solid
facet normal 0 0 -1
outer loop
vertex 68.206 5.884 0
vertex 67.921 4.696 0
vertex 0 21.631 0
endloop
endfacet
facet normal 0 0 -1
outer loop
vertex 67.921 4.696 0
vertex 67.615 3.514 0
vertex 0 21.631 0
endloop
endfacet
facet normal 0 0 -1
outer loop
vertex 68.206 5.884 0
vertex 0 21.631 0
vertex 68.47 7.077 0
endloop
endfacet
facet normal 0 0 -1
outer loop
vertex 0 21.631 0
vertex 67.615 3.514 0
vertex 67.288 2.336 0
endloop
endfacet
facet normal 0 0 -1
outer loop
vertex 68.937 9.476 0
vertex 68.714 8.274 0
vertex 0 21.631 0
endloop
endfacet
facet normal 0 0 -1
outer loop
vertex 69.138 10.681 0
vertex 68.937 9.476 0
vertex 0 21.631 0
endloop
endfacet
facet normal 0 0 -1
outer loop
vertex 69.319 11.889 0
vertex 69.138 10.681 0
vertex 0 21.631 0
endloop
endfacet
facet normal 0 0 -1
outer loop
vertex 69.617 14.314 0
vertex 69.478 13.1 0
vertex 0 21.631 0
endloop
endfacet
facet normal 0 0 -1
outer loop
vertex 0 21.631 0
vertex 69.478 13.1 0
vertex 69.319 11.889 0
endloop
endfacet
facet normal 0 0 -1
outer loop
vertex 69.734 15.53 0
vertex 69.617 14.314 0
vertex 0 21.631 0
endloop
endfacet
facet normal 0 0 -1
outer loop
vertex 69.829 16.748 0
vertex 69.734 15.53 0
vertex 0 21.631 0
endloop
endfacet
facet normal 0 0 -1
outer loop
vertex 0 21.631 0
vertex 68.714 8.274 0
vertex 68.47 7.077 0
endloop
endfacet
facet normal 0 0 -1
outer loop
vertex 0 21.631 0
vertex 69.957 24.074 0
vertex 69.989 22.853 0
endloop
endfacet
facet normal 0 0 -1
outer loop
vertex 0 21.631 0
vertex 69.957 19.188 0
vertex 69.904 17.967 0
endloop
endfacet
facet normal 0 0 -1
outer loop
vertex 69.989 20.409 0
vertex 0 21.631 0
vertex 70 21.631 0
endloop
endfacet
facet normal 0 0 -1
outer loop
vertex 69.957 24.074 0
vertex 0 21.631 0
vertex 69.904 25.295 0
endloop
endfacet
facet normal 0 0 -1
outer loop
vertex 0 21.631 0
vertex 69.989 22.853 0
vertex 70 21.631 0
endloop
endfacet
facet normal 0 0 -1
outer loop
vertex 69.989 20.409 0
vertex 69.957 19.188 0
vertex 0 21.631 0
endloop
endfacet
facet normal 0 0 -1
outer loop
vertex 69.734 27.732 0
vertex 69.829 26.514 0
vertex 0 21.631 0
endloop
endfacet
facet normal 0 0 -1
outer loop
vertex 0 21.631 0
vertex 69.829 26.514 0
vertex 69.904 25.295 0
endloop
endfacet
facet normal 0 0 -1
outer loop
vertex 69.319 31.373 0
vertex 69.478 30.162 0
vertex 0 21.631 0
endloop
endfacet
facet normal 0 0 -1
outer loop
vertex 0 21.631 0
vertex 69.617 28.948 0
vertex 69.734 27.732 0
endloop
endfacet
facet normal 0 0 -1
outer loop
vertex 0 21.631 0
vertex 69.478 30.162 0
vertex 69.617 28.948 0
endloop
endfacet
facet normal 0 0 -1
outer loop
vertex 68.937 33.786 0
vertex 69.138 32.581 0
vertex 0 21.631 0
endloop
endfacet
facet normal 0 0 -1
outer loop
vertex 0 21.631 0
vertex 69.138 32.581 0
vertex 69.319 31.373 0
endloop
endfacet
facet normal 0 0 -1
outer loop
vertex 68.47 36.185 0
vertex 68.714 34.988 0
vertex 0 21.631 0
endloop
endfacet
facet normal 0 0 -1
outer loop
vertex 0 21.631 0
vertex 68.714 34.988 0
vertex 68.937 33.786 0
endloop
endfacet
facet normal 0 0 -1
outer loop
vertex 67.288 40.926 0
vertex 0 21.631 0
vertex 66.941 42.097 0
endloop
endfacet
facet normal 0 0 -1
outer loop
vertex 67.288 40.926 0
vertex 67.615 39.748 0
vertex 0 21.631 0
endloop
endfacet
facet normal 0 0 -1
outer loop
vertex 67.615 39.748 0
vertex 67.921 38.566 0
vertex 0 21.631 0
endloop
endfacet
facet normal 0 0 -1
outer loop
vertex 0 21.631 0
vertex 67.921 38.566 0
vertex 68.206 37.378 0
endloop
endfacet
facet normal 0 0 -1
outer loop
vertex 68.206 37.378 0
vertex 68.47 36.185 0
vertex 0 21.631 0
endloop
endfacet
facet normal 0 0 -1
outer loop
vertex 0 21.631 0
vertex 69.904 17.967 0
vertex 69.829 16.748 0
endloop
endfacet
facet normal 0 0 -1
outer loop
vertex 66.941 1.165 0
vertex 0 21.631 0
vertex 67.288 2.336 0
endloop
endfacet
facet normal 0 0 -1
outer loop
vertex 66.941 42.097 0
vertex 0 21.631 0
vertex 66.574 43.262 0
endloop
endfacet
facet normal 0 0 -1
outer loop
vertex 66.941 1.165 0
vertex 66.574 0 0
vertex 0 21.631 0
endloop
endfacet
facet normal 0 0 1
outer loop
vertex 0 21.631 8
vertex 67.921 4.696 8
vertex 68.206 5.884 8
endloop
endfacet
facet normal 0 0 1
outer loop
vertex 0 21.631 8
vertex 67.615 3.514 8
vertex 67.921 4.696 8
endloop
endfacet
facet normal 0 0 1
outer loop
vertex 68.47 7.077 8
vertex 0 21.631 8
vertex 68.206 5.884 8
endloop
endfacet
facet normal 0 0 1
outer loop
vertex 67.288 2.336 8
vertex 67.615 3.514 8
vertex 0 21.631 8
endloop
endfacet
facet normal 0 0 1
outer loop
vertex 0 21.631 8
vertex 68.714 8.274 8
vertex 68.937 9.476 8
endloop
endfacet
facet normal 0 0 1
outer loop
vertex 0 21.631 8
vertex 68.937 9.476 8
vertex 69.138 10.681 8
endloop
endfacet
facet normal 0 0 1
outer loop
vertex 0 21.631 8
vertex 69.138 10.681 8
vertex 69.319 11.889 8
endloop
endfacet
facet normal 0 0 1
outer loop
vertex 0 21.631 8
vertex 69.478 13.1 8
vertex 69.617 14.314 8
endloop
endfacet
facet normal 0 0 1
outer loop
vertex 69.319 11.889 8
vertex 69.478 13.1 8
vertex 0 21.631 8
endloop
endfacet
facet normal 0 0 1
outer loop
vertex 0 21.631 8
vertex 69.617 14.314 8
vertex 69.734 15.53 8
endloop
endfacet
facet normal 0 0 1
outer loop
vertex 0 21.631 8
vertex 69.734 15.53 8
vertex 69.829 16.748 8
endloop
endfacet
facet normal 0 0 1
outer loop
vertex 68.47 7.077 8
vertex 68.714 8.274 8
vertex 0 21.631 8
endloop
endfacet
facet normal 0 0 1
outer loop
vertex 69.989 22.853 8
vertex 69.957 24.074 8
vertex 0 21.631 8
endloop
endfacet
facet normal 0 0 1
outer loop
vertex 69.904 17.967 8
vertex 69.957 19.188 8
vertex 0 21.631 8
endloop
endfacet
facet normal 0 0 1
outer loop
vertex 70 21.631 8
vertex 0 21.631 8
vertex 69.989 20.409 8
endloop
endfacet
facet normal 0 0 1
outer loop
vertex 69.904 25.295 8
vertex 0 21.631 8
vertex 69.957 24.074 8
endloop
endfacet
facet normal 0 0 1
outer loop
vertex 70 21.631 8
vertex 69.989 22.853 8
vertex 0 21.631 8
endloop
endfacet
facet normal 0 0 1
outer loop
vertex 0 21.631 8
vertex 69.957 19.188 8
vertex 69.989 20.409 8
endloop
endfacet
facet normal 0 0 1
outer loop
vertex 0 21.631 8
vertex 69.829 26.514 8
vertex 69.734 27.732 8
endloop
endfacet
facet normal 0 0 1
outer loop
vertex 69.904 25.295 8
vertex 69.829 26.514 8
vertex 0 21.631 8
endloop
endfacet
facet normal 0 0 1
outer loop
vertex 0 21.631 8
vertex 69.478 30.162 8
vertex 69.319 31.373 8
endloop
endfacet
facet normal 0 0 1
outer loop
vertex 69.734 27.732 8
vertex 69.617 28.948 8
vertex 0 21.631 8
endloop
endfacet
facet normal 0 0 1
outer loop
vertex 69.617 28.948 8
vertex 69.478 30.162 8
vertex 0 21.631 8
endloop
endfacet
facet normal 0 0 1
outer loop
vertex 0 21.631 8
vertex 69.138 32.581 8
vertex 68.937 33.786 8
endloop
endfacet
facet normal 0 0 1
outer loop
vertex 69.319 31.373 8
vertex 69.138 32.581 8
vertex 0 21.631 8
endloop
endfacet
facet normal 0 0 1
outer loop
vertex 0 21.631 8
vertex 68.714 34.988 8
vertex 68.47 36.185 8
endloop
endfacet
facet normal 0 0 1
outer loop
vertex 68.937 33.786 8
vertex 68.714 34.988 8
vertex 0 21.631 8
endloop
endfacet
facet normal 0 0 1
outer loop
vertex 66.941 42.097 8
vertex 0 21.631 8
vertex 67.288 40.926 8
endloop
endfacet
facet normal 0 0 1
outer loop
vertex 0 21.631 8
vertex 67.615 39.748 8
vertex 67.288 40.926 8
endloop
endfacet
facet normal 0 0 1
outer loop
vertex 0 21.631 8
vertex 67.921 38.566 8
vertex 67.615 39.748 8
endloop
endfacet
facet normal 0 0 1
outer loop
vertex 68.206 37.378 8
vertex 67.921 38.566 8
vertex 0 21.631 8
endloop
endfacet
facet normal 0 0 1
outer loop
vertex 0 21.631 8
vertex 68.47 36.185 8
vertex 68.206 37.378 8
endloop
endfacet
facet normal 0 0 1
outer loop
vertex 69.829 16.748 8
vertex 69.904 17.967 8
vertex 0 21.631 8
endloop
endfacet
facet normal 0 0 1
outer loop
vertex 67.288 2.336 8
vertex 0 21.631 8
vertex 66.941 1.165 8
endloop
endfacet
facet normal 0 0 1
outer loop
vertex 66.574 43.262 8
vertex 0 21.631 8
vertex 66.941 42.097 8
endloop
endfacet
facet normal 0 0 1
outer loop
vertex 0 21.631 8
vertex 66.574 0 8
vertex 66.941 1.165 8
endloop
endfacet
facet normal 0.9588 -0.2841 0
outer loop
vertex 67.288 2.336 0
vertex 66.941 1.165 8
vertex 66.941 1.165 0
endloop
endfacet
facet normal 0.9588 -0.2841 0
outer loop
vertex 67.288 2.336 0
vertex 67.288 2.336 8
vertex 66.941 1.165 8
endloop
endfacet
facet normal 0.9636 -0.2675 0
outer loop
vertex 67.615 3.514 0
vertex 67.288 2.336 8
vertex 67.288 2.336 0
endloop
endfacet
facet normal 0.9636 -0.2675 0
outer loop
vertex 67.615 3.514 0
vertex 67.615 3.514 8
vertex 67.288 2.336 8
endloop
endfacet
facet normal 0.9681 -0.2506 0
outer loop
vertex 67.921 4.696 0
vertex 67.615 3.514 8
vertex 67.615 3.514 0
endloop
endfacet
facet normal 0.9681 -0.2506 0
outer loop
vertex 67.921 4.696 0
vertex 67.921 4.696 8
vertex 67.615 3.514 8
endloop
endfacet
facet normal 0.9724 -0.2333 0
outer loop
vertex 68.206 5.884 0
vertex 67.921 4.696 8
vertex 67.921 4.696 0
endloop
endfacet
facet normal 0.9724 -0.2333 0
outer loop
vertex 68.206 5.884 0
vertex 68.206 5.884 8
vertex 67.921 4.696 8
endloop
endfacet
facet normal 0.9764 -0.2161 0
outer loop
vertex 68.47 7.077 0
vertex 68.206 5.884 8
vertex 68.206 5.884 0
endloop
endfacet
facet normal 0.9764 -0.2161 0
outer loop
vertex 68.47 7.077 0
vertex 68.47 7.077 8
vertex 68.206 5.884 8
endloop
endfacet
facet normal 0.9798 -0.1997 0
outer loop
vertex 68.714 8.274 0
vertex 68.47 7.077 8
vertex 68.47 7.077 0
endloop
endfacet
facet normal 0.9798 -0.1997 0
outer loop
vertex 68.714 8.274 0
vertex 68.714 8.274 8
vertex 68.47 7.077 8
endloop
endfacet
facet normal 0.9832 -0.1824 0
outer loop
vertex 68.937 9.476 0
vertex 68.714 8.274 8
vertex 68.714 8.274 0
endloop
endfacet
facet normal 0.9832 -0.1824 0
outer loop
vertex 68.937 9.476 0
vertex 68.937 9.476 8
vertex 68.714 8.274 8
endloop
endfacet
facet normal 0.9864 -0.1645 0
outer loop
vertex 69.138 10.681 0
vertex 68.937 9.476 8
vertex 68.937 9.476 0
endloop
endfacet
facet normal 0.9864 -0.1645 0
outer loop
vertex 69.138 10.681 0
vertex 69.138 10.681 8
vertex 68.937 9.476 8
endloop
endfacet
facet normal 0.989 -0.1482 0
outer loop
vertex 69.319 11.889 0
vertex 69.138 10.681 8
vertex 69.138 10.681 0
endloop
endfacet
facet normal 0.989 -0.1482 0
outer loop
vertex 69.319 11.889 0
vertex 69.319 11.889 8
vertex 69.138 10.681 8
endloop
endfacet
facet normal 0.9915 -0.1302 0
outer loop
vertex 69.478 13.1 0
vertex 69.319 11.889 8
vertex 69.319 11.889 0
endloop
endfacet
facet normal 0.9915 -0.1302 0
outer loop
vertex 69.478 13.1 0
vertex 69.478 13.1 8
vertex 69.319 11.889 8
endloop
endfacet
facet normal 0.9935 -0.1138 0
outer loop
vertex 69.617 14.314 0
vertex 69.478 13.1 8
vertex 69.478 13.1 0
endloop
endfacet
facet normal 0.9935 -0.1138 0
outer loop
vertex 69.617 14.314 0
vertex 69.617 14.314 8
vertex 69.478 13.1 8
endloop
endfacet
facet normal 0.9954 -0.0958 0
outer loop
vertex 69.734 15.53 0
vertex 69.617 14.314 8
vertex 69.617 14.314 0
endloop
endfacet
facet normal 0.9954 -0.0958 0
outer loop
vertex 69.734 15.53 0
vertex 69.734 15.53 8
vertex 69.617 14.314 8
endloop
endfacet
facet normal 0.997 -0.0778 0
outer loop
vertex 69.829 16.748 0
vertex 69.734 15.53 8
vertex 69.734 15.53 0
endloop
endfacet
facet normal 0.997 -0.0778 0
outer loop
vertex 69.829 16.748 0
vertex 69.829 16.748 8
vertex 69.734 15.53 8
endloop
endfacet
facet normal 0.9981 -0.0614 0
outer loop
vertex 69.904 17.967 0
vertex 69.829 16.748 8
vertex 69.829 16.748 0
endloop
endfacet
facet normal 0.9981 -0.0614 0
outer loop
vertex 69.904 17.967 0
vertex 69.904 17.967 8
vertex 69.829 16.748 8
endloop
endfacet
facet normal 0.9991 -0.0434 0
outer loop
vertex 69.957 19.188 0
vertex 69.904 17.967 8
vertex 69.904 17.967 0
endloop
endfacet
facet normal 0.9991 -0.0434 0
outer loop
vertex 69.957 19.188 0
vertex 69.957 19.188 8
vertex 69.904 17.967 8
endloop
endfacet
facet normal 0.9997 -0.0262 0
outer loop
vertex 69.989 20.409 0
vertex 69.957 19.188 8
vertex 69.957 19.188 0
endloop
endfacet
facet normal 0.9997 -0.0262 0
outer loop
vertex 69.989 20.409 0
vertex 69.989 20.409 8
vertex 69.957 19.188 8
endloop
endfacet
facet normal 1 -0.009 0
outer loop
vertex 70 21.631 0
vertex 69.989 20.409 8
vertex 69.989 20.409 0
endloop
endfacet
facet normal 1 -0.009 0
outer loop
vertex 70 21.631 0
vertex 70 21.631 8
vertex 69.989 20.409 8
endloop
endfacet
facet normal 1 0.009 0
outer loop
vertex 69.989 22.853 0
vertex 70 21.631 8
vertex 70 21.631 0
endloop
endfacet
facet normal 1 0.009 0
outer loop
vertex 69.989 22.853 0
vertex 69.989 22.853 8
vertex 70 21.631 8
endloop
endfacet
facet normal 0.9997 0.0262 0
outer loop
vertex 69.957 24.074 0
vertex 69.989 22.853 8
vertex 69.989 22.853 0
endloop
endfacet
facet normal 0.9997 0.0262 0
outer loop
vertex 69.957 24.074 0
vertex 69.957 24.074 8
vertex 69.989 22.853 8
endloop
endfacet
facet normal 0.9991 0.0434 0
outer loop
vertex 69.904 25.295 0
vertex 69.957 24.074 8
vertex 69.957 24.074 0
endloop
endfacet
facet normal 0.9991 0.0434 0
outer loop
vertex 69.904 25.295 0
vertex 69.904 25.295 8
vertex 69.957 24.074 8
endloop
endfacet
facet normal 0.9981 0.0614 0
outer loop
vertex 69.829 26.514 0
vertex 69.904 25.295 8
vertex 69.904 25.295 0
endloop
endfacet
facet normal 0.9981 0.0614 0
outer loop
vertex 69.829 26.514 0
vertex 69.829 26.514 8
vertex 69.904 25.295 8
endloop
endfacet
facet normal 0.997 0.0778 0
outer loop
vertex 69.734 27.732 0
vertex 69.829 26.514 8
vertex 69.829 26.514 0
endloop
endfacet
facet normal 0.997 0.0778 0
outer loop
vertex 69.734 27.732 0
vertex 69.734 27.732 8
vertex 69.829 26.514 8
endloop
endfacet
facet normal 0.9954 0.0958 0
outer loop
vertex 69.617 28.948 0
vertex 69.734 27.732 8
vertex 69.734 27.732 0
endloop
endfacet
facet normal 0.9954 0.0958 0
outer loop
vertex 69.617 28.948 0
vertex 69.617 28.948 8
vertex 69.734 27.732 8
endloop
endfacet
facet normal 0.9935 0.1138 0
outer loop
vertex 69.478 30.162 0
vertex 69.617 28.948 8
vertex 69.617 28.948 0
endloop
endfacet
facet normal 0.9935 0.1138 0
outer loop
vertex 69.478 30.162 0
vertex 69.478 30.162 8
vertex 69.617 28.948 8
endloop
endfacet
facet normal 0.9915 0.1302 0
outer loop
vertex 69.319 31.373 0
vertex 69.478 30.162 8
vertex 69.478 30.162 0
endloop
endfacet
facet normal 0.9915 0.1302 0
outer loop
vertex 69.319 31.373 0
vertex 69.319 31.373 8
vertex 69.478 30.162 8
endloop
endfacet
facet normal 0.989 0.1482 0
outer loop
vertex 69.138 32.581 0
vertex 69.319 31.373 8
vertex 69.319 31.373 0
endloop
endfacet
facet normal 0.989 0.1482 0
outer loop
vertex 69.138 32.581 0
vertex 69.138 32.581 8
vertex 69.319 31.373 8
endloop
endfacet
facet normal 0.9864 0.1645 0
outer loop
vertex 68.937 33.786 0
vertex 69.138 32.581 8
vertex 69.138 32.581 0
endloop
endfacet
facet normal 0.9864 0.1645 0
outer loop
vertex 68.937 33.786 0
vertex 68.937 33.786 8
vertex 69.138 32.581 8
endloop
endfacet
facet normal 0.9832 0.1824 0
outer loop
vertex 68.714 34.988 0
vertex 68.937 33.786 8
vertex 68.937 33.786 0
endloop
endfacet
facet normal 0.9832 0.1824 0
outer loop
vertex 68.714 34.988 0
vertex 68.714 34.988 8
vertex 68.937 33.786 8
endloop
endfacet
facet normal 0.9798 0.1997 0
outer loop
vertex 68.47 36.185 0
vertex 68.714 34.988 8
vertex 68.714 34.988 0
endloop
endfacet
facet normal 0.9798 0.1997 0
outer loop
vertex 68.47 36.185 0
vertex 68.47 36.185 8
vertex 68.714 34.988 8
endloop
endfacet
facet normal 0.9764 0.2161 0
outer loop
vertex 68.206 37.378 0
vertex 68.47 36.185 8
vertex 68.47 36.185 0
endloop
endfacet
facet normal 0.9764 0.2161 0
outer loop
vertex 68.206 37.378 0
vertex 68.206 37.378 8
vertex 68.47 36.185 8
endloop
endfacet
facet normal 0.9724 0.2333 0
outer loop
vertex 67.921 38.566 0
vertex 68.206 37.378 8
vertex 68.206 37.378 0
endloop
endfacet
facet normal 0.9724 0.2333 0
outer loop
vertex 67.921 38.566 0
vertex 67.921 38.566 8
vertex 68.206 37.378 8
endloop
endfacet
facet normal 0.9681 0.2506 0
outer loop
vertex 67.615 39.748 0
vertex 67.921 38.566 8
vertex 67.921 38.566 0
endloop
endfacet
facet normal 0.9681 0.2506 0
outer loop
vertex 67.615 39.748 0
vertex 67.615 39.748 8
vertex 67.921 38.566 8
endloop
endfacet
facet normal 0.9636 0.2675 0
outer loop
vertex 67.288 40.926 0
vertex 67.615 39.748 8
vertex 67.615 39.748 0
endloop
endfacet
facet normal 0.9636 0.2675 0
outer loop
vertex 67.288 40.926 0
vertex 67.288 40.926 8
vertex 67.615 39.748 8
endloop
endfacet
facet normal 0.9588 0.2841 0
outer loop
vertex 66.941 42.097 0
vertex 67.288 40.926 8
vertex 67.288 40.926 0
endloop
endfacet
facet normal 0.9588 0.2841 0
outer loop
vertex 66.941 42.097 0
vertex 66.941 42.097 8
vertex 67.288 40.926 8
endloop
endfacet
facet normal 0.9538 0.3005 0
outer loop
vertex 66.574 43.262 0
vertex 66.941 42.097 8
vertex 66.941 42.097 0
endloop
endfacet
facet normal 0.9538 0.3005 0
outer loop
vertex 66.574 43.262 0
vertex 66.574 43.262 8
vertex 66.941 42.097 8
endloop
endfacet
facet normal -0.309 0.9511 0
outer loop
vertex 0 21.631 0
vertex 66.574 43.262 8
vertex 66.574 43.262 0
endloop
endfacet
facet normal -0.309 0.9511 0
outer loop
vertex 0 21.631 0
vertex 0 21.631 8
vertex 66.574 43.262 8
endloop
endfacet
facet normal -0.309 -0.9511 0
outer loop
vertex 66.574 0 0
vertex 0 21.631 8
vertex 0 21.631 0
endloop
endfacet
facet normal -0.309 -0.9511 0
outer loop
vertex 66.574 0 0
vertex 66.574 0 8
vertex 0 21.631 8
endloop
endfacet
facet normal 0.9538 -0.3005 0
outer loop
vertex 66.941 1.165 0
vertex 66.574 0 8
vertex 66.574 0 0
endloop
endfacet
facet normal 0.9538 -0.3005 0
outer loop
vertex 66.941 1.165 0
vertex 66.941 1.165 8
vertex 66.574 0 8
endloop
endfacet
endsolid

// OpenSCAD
$fn = 32;

// ----------------------------------------------------------------------
// Arc profile plate: sector, 38 points
// ----------------------------------------------------------------------

// --- parameters (mm) ---
sector_angle = 36;        // sector angle, degrees
sector_r = 70;            // outer radius
arc_step = 1;             // sampling step of the arc, degrees
plate_t = 8;              // plate thickness, Z

bbox_x = 2 * sector_r * sin(sector_angle / 2);  // chord of the sector
bbox_y = sector_r;  // depth of the sector (apex to arc)

profile = [[66.574, 0], [66.941, 1.165], [67.288, 2.336], [67.615, 3.514], [67.921, 4.696], [68.206, 5.884], [68.47, 7.077], [68.714, 8.274], [68.937, 9.476], [69.138, 10.681], [69.319, 11.889], [69.478, 13.1], [69.617, 14.314], [69.734, 15.53], [69.829, 16.748], [69.904, 17.967], [69.957, 19.188], [69.989, 20.409], [70, 21.631], [69.989, 22.853], [69.957, 24.074], [69.904, 25.295], [69.829, 26.514], [69.734, 27.732], [69.617, 28.948], [69.478, 30.162], [69.319, 31.373], [69.138, 32.581], [68.937, 33.786], [68.714, 34.988], [68.47, 36.185], [68.206, 37.378], [67.921, 38.566], [67.615, 39.748], [67.288, 40.926], [66.941, 42.097], [66.574, 43.262], [0, 21.631]];  // primary outline, 38 points, counter clockwise

// --- the one profile operation ---
linear_extrude(height = plate_t) polygon(points = profile);
